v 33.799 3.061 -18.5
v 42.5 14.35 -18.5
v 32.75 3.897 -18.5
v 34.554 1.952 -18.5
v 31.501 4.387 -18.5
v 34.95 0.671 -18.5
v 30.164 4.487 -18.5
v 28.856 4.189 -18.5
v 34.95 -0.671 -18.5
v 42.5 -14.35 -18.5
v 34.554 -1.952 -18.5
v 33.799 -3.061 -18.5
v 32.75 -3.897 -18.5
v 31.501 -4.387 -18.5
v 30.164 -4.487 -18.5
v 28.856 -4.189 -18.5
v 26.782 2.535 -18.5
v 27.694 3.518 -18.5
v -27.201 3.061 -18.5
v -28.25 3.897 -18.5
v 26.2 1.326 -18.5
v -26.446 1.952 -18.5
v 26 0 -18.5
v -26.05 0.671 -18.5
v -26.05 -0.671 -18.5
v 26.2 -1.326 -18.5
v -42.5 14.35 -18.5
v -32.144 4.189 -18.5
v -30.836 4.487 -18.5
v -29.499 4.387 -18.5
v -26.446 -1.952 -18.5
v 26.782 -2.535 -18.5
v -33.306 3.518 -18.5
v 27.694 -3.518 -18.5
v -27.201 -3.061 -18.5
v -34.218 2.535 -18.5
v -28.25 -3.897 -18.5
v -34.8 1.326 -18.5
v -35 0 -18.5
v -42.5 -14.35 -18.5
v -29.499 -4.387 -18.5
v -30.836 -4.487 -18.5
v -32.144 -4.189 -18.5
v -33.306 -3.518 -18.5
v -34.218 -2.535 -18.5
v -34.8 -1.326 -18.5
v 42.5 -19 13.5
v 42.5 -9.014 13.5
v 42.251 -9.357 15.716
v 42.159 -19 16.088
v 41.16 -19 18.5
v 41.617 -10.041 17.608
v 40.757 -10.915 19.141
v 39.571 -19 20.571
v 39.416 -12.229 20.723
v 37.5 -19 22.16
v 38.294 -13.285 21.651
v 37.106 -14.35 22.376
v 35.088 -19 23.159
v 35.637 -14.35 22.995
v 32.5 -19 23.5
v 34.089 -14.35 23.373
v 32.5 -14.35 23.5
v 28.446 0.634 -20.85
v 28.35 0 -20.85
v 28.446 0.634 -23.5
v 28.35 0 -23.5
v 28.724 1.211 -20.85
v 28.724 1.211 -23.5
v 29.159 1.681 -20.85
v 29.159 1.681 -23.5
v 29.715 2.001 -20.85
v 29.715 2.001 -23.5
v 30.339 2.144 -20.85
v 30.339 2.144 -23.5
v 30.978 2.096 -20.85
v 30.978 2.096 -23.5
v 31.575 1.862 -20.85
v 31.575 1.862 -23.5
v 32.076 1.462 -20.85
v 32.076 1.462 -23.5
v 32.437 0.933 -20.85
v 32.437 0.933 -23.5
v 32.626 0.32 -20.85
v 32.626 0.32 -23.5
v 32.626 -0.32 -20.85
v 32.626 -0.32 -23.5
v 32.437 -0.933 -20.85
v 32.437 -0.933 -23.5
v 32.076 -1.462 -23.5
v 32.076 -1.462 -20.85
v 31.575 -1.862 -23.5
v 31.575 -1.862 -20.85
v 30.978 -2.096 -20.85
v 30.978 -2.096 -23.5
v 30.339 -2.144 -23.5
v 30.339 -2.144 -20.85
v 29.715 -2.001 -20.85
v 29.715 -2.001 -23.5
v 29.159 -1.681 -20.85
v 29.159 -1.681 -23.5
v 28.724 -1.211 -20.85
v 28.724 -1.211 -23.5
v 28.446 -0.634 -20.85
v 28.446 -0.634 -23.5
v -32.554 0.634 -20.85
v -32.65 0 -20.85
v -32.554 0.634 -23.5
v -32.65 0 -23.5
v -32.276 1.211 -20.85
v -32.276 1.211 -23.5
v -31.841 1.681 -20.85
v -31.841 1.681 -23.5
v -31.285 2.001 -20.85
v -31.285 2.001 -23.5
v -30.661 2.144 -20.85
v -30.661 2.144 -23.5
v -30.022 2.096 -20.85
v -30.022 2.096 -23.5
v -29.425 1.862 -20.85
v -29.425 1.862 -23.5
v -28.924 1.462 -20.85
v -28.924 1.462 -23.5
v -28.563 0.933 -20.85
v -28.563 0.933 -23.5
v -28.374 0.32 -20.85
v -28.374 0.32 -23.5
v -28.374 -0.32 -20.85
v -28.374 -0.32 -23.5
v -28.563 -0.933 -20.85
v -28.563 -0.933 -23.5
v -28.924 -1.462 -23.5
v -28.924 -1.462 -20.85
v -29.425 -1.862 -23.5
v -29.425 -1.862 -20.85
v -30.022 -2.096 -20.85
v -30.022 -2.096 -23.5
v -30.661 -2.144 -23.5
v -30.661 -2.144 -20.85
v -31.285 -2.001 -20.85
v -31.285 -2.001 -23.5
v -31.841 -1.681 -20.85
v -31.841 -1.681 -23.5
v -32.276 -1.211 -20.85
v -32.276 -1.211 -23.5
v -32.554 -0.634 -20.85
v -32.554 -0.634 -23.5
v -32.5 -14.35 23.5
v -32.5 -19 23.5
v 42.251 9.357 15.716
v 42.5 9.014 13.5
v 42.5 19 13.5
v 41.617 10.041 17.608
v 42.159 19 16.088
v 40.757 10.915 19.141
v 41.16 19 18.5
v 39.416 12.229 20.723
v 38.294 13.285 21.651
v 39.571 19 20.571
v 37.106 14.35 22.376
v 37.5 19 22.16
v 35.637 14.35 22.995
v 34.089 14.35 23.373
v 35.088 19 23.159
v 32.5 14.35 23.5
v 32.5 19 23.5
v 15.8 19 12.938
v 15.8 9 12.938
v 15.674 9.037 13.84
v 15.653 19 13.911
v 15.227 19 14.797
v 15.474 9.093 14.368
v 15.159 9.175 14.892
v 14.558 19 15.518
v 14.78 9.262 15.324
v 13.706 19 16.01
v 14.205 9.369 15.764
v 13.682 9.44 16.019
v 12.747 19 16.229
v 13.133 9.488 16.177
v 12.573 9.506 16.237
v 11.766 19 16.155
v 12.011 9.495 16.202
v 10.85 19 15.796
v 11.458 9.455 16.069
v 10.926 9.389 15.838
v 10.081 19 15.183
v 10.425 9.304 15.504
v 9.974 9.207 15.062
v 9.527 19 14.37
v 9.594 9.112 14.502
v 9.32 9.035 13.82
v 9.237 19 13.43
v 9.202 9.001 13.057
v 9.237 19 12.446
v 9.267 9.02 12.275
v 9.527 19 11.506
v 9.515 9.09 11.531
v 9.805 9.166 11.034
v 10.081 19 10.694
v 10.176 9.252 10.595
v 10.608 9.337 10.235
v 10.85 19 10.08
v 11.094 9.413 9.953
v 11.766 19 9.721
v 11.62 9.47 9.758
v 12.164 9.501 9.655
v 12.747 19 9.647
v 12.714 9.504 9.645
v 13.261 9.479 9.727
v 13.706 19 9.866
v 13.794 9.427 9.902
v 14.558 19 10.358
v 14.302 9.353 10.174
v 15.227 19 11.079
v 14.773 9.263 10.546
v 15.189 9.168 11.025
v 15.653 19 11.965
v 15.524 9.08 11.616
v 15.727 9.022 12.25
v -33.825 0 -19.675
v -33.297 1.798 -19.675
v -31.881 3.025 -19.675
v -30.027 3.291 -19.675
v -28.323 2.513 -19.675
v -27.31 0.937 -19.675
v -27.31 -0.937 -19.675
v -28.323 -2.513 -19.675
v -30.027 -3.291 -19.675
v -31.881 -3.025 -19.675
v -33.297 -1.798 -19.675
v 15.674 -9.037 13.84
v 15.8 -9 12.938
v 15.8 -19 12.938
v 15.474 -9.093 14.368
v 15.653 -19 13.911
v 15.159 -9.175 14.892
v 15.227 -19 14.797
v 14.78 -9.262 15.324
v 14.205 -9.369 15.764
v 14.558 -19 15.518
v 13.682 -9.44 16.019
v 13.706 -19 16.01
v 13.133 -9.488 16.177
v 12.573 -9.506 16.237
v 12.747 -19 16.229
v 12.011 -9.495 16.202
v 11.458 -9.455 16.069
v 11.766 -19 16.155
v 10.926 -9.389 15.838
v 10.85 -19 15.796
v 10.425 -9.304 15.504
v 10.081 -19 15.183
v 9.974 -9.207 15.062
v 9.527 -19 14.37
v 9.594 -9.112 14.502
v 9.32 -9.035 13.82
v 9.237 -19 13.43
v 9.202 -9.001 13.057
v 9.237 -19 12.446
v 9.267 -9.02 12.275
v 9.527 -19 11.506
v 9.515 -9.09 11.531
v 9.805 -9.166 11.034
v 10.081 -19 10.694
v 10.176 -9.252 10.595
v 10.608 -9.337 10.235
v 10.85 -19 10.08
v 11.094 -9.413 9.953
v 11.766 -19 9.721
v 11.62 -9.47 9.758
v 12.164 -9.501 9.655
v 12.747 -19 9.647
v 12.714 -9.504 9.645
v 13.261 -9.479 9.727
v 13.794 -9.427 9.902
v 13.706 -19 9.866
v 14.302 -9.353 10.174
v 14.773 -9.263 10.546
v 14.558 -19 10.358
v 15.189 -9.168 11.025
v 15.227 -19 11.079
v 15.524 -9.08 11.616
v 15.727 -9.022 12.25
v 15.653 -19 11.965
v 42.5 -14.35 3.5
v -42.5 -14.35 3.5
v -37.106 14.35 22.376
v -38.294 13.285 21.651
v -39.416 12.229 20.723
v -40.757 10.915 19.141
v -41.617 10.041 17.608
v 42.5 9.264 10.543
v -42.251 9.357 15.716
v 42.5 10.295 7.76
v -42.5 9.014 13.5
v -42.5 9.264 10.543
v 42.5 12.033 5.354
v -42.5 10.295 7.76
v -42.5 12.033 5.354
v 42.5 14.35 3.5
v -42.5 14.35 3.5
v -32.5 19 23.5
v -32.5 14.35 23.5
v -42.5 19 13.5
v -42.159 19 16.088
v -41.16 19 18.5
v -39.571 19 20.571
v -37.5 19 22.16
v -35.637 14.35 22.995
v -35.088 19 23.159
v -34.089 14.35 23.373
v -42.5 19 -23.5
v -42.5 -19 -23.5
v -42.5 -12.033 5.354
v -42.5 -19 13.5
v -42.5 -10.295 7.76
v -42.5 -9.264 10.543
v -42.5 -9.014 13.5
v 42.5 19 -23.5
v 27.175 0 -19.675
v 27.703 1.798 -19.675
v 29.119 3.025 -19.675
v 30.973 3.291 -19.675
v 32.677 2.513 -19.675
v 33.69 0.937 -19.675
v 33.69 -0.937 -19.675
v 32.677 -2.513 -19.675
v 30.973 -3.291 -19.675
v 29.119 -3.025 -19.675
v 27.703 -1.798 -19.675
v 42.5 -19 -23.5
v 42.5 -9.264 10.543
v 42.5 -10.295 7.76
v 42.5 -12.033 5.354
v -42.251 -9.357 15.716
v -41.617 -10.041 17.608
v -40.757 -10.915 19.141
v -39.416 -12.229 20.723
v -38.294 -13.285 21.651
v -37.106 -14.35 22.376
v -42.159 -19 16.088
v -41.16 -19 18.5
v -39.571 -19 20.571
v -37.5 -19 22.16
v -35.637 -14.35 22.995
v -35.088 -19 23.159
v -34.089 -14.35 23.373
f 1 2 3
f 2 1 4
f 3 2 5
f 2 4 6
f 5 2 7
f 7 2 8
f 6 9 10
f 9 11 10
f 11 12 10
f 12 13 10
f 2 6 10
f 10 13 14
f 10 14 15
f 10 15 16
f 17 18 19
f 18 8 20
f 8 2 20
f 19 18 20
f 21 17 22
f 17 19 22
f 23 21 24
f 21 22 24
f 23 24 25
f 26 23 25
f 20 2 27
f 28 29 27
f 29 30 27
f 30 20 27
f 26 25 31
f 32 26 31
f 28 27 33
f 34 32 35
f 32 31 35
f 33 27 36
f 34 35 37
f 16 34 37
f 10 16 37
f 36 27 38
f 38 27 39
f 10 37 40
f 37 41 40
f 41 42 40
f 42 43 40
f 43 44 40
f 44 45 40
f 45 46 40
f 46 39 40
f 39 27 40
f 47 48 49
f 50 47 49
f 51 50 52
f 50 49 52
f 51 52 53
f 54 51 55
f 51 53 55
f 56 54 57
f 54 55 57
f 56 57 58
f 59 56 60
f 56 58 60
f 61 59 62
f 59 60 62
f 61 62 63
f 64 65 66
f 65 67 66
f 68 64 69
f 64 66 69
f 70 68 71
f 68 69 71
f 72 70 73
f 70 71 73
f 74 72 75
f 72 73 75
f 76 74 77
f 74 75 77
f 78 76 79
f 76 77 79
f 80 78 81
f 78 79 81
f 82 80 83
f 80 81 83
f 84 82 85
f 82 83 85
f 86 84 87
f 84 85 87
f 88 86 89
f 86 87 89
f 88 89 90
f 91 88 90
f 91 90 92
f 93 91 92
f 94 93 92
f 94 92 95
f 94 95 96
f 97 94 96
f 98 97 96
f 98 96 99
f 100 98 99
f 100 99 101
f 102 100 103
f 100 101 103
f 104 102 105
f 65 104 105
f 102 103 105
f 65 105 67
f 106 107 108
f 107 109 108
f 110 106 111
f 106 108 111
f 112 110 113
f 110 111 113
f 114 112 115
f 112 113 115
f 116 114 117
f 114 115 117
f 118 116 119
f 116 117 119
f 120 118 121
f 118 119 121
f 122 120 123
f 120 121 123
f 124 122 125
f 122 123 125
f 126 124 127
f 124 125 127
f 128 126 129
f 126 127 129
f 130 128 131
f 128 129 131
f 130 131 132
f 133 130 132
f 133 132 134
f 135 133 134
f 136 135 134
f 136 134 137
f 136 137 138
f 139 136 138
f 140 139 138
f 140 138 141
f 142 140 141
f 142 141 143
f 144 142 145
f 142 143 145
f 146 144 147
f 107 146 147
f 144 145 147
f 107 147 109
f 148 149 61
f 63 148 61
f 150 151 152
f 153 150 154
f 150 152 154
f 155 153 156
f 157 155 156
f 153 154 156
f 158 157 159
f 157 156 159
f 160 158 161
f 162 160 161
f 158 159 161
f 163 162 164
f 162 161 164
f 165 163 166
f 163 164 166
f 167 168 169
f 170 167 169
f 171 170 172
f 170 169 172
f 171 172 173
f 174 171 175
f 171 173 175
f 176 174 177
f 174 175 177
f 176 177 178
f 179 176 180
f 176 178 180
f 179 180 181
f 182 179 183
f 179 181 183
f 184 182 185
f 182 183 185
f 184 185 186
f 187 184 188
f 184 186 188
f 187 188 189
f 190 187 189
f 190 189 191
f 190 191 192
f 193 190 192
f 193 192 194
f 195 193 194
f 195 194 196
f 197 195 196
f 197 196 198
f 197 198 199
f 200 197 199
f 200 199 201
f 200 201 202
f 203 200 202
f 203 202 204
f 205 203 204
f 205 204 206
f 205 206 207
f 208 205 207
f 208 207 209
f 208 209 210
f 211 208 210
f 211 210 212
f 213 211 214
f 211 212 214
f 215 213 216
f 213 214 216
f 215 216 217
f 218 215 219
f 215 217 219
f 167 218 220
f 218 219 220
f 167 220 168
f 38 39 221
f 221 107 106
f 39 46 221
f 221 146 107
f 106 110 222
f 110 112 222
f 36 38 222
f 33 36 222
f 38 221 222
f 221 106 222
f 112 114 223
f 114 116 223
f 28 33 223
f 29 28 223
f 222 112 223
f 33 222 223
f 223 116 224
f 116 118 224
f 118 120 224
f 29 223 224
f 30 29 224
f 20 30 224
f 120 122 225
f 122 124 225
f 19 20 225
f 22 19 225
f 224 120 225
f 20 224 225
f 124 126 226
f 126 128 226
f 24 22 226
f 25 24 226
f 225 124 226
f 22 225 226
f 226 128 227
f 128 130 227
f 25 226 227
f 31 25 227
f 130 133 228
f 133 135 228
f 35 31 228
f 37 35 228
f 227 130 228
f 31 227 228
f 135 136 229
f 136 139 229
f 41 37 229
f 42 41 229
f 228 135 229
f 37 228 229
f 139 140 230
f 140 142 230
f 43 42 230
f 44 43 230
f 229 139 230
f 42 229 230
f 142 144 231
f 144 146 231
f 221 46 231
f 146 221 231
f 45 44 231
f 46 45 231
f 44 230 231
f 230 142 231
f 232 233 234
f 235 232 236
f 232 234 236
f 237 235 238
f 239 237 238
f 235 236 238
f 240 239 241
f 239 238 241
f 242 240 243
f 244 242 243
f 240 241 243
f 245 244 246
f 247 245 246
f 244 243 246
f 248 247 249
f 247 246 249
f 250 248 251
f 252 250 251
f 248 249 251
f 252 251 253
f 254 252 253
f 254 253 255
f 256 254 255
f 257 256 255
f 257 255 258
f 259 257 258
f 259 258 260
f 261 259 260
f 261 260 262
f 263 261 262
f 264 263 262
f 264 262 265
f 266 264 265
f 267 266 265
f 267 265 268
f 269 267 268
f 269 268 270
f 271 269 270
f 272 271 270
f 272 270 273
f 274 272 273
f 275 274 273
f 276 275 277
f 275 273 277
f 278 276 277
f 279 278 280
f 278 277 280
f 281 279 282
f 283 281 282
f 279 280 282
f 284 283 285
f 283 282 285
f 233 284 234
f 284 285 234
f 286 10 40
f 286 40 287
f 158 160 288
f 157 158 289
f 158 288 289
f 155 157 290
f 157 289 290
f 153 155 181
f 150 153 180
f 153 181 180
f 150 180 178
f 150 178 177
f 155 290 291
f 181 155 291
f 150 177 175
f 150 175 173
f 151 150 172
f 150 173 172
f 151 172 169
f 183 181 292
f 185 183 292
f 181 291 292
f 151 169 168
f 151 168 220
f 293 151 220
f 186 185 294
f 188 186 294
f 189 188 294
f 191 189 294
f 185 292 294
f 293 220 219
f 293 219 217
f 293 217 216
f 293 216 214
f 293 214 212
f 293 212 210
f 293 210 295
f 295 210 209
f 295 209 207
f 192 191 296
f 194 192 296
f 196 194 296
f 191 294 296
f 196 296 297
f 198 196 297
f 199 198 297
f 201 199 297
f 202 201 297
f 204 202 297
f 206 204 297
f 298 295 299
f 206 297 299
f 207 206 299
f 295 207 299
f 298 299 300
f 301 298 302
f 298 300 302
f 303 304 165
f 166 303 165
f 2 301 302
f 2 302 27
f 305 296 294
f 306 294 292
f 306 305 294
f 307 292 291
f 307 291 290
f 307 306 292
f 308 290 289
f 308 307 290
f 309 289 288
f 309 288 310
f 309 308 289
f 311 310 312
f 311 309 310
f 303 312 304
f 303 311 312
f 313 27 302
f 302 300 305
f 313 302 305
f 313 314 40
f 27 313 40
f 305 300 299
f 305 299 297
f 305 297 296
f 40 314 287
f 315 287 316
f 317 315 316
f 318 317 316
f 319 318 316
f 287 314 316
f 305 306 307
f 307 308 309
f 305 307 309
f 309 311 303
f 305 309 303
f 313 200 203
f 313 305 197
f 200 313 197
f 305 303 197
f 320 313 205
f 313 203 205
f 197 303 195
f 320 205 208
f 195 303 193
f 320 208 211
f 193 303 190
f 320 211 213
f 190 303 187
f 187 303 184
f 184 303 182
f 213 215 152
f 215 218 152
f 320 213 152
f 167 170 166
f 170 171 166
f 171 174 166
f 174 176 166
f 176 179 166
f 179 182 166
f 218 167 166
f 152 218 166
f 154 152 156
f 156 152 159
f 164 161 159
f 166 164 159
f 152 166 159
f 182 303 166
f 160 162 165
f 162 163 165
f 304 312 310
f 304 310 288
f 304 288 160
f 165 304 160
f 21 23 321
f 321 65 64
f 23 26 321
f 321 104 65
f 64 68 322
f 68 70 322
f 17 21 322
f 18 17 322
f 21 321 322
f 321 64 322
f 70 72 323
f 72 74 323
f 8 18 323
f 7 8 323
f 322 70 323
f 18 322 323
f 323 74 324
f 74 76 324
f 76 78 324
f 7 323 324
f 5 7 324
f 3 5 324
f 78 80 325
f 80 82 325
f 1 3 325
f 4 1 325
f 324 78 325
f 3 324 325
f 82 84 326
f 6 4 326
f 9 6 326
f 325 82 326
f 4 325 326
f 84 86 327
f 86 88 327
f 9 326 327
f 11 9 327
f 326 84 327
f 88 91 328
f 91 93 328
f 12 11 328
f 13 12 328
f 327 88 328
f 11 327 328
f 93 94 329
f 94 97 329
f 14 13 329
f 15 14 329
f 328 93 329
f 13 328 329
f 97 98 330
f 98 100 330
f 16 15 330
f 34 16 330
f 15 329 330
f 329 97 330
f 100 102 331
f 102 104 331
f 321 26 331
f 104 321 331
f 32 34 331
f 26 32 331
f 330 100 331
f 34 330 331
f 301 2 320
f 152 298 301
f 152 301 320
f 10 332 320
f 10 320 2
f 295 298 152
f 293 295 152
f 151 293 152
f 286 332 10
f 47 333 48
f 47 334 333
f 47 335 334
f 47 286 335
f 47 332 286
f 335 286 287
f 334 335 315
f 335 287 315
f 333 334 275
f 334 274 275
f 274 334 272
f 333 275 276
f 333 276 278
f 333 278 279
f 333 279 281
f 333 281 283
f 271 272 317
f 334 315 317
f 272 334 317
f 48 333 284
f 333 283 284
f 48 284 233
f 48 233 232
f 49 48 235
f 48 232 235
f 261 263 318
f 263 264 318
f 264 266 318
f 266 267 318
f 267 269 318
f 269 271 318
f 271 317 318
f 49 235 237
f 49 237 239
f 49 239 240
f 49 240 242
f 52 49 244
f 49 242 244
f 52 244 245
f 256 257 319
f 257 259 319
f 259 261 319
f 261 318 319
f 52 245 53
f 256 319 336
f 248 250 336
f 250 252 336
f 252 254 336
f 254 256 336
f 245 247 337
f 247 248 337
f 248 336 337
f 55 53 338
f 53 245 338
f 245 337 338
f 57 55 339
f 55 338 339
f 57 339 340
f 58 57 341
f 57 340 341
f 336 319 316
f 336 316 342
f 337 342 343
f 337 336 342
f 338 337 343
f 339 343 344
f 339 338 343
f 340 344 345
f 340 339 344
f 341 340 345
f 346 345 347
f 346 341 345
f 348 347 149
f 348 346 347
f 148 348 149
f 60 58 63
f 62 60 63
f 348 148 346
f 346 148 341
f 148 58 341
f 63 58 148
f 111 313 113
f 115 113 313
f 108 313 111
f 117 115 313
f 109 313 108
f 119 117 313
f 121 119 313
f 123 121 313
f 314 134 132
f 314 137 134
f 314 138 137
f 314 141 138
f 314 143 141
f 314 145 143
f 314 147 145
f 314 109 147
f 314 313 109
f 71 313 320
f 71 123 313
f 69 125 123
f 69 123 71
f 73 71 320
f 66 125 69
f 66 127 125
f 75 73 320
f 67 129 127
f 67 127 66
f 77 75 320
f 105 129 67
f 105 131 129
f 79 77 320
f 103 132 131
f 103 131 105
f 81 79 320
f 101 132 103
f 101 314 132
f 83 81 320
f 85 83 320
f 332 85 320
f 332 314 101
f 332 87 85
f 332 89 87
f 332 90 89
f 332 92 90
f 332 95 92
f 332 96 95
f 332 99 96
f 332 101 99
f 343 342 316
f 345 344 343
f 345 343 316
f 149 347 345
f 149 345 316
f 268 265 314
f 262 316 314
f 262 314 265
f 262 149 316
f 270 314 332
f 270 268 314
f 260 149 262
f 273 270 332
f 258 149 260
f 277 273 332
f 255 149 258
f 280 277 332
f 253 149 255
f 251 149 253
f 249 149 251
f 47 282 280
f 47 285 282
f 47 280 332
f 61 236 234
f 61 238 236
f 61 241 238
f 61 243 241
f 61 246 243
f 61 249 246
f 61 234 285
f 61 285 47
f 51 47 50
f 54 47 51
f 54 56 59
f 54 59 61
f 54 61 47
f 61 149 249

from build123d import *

# Parameters (mm, degrees)
F0_W           = 85
F0_H           = 47
F1_DEPTH       = 19
F3_DEPTH       = 85.001
F4_R           = 3.3
F5_DEPTH       = 38.001
F7_D           = 4.3
F7_CSINK_D     = 9
F7_CSINK_ANGLE = 90
F8_R           = 10


with BuildPart() as f1:
    # F0 (on Front) → F1 (new body, symmetric)
    with BuildSketch(Plane.XZ):
        Rectangle(F0_W, F0_H)
    extrude(amount=F1_DEPTH, both=True)

    # F2 (on face) → F3 (cut, through all)
    with BuildSketch(Plane(origin=(-42.5, 0, 0), x_dir=(0, -1, 0), z_dir=(-1, 0, 0))):
        with BuildLine():
            Line((-14.35, 3.5), (-14.35, -18.5))
            Line((-14.35, -18.5), (14.35, -18.5))
            Line((14.35, -18.5), (14.35, 3.5))
            ThreePointArc((14.35, 3.5), (9, 12.93808773), (14.35, 22.3761754601))
            Line((14.35, 22.3761754601), (14.35, 23.5))
            Line((14.35, 23.5), (-14.35, 23.5))
            Line((-14.35, 23.5), (-14.35, 22.3761754601))
            ThreePointArc((-14.35, 22.3761754601), (-9, 12.93808773), (-14.35, 3.5))
        make_face()
    extrude(amount=-F3_DEPTH, mode=Mode.SUBTRACT)

    # F4 (on face) → F5 (cut, through all)
    with BuildSketch(Plane.XZ.offset(19)):
        with Locations((12.5, 12.93808773)):
            Circle(F4_R)
    extrude(amount=-F5_DEPTH, mode=Mode.SUBTRACT)

    # F7 (through all)
    with Locations(Plane.XY.offset(-18.5)):
        with Locations((-30.5, 0), (30.5, 0)):
            CounterSinkHole(F7_D / 2, F7_CSINK_D / 2, counter_sink_angle=F7_CSINK_ANGLE)

    # F8
    f8_edges = [f1.edges().sort_by_distance(p)[0] for p in [
        (-42.5, 16.675, 23.5),
        (-42.5, -16.675, 23.5),
        (42.5, 16.675, 23.5),
        (42.5, -16.675, 23.5),
    ]]
    fillet(f8_edges, radius=F8_R)


solid = f1.part
